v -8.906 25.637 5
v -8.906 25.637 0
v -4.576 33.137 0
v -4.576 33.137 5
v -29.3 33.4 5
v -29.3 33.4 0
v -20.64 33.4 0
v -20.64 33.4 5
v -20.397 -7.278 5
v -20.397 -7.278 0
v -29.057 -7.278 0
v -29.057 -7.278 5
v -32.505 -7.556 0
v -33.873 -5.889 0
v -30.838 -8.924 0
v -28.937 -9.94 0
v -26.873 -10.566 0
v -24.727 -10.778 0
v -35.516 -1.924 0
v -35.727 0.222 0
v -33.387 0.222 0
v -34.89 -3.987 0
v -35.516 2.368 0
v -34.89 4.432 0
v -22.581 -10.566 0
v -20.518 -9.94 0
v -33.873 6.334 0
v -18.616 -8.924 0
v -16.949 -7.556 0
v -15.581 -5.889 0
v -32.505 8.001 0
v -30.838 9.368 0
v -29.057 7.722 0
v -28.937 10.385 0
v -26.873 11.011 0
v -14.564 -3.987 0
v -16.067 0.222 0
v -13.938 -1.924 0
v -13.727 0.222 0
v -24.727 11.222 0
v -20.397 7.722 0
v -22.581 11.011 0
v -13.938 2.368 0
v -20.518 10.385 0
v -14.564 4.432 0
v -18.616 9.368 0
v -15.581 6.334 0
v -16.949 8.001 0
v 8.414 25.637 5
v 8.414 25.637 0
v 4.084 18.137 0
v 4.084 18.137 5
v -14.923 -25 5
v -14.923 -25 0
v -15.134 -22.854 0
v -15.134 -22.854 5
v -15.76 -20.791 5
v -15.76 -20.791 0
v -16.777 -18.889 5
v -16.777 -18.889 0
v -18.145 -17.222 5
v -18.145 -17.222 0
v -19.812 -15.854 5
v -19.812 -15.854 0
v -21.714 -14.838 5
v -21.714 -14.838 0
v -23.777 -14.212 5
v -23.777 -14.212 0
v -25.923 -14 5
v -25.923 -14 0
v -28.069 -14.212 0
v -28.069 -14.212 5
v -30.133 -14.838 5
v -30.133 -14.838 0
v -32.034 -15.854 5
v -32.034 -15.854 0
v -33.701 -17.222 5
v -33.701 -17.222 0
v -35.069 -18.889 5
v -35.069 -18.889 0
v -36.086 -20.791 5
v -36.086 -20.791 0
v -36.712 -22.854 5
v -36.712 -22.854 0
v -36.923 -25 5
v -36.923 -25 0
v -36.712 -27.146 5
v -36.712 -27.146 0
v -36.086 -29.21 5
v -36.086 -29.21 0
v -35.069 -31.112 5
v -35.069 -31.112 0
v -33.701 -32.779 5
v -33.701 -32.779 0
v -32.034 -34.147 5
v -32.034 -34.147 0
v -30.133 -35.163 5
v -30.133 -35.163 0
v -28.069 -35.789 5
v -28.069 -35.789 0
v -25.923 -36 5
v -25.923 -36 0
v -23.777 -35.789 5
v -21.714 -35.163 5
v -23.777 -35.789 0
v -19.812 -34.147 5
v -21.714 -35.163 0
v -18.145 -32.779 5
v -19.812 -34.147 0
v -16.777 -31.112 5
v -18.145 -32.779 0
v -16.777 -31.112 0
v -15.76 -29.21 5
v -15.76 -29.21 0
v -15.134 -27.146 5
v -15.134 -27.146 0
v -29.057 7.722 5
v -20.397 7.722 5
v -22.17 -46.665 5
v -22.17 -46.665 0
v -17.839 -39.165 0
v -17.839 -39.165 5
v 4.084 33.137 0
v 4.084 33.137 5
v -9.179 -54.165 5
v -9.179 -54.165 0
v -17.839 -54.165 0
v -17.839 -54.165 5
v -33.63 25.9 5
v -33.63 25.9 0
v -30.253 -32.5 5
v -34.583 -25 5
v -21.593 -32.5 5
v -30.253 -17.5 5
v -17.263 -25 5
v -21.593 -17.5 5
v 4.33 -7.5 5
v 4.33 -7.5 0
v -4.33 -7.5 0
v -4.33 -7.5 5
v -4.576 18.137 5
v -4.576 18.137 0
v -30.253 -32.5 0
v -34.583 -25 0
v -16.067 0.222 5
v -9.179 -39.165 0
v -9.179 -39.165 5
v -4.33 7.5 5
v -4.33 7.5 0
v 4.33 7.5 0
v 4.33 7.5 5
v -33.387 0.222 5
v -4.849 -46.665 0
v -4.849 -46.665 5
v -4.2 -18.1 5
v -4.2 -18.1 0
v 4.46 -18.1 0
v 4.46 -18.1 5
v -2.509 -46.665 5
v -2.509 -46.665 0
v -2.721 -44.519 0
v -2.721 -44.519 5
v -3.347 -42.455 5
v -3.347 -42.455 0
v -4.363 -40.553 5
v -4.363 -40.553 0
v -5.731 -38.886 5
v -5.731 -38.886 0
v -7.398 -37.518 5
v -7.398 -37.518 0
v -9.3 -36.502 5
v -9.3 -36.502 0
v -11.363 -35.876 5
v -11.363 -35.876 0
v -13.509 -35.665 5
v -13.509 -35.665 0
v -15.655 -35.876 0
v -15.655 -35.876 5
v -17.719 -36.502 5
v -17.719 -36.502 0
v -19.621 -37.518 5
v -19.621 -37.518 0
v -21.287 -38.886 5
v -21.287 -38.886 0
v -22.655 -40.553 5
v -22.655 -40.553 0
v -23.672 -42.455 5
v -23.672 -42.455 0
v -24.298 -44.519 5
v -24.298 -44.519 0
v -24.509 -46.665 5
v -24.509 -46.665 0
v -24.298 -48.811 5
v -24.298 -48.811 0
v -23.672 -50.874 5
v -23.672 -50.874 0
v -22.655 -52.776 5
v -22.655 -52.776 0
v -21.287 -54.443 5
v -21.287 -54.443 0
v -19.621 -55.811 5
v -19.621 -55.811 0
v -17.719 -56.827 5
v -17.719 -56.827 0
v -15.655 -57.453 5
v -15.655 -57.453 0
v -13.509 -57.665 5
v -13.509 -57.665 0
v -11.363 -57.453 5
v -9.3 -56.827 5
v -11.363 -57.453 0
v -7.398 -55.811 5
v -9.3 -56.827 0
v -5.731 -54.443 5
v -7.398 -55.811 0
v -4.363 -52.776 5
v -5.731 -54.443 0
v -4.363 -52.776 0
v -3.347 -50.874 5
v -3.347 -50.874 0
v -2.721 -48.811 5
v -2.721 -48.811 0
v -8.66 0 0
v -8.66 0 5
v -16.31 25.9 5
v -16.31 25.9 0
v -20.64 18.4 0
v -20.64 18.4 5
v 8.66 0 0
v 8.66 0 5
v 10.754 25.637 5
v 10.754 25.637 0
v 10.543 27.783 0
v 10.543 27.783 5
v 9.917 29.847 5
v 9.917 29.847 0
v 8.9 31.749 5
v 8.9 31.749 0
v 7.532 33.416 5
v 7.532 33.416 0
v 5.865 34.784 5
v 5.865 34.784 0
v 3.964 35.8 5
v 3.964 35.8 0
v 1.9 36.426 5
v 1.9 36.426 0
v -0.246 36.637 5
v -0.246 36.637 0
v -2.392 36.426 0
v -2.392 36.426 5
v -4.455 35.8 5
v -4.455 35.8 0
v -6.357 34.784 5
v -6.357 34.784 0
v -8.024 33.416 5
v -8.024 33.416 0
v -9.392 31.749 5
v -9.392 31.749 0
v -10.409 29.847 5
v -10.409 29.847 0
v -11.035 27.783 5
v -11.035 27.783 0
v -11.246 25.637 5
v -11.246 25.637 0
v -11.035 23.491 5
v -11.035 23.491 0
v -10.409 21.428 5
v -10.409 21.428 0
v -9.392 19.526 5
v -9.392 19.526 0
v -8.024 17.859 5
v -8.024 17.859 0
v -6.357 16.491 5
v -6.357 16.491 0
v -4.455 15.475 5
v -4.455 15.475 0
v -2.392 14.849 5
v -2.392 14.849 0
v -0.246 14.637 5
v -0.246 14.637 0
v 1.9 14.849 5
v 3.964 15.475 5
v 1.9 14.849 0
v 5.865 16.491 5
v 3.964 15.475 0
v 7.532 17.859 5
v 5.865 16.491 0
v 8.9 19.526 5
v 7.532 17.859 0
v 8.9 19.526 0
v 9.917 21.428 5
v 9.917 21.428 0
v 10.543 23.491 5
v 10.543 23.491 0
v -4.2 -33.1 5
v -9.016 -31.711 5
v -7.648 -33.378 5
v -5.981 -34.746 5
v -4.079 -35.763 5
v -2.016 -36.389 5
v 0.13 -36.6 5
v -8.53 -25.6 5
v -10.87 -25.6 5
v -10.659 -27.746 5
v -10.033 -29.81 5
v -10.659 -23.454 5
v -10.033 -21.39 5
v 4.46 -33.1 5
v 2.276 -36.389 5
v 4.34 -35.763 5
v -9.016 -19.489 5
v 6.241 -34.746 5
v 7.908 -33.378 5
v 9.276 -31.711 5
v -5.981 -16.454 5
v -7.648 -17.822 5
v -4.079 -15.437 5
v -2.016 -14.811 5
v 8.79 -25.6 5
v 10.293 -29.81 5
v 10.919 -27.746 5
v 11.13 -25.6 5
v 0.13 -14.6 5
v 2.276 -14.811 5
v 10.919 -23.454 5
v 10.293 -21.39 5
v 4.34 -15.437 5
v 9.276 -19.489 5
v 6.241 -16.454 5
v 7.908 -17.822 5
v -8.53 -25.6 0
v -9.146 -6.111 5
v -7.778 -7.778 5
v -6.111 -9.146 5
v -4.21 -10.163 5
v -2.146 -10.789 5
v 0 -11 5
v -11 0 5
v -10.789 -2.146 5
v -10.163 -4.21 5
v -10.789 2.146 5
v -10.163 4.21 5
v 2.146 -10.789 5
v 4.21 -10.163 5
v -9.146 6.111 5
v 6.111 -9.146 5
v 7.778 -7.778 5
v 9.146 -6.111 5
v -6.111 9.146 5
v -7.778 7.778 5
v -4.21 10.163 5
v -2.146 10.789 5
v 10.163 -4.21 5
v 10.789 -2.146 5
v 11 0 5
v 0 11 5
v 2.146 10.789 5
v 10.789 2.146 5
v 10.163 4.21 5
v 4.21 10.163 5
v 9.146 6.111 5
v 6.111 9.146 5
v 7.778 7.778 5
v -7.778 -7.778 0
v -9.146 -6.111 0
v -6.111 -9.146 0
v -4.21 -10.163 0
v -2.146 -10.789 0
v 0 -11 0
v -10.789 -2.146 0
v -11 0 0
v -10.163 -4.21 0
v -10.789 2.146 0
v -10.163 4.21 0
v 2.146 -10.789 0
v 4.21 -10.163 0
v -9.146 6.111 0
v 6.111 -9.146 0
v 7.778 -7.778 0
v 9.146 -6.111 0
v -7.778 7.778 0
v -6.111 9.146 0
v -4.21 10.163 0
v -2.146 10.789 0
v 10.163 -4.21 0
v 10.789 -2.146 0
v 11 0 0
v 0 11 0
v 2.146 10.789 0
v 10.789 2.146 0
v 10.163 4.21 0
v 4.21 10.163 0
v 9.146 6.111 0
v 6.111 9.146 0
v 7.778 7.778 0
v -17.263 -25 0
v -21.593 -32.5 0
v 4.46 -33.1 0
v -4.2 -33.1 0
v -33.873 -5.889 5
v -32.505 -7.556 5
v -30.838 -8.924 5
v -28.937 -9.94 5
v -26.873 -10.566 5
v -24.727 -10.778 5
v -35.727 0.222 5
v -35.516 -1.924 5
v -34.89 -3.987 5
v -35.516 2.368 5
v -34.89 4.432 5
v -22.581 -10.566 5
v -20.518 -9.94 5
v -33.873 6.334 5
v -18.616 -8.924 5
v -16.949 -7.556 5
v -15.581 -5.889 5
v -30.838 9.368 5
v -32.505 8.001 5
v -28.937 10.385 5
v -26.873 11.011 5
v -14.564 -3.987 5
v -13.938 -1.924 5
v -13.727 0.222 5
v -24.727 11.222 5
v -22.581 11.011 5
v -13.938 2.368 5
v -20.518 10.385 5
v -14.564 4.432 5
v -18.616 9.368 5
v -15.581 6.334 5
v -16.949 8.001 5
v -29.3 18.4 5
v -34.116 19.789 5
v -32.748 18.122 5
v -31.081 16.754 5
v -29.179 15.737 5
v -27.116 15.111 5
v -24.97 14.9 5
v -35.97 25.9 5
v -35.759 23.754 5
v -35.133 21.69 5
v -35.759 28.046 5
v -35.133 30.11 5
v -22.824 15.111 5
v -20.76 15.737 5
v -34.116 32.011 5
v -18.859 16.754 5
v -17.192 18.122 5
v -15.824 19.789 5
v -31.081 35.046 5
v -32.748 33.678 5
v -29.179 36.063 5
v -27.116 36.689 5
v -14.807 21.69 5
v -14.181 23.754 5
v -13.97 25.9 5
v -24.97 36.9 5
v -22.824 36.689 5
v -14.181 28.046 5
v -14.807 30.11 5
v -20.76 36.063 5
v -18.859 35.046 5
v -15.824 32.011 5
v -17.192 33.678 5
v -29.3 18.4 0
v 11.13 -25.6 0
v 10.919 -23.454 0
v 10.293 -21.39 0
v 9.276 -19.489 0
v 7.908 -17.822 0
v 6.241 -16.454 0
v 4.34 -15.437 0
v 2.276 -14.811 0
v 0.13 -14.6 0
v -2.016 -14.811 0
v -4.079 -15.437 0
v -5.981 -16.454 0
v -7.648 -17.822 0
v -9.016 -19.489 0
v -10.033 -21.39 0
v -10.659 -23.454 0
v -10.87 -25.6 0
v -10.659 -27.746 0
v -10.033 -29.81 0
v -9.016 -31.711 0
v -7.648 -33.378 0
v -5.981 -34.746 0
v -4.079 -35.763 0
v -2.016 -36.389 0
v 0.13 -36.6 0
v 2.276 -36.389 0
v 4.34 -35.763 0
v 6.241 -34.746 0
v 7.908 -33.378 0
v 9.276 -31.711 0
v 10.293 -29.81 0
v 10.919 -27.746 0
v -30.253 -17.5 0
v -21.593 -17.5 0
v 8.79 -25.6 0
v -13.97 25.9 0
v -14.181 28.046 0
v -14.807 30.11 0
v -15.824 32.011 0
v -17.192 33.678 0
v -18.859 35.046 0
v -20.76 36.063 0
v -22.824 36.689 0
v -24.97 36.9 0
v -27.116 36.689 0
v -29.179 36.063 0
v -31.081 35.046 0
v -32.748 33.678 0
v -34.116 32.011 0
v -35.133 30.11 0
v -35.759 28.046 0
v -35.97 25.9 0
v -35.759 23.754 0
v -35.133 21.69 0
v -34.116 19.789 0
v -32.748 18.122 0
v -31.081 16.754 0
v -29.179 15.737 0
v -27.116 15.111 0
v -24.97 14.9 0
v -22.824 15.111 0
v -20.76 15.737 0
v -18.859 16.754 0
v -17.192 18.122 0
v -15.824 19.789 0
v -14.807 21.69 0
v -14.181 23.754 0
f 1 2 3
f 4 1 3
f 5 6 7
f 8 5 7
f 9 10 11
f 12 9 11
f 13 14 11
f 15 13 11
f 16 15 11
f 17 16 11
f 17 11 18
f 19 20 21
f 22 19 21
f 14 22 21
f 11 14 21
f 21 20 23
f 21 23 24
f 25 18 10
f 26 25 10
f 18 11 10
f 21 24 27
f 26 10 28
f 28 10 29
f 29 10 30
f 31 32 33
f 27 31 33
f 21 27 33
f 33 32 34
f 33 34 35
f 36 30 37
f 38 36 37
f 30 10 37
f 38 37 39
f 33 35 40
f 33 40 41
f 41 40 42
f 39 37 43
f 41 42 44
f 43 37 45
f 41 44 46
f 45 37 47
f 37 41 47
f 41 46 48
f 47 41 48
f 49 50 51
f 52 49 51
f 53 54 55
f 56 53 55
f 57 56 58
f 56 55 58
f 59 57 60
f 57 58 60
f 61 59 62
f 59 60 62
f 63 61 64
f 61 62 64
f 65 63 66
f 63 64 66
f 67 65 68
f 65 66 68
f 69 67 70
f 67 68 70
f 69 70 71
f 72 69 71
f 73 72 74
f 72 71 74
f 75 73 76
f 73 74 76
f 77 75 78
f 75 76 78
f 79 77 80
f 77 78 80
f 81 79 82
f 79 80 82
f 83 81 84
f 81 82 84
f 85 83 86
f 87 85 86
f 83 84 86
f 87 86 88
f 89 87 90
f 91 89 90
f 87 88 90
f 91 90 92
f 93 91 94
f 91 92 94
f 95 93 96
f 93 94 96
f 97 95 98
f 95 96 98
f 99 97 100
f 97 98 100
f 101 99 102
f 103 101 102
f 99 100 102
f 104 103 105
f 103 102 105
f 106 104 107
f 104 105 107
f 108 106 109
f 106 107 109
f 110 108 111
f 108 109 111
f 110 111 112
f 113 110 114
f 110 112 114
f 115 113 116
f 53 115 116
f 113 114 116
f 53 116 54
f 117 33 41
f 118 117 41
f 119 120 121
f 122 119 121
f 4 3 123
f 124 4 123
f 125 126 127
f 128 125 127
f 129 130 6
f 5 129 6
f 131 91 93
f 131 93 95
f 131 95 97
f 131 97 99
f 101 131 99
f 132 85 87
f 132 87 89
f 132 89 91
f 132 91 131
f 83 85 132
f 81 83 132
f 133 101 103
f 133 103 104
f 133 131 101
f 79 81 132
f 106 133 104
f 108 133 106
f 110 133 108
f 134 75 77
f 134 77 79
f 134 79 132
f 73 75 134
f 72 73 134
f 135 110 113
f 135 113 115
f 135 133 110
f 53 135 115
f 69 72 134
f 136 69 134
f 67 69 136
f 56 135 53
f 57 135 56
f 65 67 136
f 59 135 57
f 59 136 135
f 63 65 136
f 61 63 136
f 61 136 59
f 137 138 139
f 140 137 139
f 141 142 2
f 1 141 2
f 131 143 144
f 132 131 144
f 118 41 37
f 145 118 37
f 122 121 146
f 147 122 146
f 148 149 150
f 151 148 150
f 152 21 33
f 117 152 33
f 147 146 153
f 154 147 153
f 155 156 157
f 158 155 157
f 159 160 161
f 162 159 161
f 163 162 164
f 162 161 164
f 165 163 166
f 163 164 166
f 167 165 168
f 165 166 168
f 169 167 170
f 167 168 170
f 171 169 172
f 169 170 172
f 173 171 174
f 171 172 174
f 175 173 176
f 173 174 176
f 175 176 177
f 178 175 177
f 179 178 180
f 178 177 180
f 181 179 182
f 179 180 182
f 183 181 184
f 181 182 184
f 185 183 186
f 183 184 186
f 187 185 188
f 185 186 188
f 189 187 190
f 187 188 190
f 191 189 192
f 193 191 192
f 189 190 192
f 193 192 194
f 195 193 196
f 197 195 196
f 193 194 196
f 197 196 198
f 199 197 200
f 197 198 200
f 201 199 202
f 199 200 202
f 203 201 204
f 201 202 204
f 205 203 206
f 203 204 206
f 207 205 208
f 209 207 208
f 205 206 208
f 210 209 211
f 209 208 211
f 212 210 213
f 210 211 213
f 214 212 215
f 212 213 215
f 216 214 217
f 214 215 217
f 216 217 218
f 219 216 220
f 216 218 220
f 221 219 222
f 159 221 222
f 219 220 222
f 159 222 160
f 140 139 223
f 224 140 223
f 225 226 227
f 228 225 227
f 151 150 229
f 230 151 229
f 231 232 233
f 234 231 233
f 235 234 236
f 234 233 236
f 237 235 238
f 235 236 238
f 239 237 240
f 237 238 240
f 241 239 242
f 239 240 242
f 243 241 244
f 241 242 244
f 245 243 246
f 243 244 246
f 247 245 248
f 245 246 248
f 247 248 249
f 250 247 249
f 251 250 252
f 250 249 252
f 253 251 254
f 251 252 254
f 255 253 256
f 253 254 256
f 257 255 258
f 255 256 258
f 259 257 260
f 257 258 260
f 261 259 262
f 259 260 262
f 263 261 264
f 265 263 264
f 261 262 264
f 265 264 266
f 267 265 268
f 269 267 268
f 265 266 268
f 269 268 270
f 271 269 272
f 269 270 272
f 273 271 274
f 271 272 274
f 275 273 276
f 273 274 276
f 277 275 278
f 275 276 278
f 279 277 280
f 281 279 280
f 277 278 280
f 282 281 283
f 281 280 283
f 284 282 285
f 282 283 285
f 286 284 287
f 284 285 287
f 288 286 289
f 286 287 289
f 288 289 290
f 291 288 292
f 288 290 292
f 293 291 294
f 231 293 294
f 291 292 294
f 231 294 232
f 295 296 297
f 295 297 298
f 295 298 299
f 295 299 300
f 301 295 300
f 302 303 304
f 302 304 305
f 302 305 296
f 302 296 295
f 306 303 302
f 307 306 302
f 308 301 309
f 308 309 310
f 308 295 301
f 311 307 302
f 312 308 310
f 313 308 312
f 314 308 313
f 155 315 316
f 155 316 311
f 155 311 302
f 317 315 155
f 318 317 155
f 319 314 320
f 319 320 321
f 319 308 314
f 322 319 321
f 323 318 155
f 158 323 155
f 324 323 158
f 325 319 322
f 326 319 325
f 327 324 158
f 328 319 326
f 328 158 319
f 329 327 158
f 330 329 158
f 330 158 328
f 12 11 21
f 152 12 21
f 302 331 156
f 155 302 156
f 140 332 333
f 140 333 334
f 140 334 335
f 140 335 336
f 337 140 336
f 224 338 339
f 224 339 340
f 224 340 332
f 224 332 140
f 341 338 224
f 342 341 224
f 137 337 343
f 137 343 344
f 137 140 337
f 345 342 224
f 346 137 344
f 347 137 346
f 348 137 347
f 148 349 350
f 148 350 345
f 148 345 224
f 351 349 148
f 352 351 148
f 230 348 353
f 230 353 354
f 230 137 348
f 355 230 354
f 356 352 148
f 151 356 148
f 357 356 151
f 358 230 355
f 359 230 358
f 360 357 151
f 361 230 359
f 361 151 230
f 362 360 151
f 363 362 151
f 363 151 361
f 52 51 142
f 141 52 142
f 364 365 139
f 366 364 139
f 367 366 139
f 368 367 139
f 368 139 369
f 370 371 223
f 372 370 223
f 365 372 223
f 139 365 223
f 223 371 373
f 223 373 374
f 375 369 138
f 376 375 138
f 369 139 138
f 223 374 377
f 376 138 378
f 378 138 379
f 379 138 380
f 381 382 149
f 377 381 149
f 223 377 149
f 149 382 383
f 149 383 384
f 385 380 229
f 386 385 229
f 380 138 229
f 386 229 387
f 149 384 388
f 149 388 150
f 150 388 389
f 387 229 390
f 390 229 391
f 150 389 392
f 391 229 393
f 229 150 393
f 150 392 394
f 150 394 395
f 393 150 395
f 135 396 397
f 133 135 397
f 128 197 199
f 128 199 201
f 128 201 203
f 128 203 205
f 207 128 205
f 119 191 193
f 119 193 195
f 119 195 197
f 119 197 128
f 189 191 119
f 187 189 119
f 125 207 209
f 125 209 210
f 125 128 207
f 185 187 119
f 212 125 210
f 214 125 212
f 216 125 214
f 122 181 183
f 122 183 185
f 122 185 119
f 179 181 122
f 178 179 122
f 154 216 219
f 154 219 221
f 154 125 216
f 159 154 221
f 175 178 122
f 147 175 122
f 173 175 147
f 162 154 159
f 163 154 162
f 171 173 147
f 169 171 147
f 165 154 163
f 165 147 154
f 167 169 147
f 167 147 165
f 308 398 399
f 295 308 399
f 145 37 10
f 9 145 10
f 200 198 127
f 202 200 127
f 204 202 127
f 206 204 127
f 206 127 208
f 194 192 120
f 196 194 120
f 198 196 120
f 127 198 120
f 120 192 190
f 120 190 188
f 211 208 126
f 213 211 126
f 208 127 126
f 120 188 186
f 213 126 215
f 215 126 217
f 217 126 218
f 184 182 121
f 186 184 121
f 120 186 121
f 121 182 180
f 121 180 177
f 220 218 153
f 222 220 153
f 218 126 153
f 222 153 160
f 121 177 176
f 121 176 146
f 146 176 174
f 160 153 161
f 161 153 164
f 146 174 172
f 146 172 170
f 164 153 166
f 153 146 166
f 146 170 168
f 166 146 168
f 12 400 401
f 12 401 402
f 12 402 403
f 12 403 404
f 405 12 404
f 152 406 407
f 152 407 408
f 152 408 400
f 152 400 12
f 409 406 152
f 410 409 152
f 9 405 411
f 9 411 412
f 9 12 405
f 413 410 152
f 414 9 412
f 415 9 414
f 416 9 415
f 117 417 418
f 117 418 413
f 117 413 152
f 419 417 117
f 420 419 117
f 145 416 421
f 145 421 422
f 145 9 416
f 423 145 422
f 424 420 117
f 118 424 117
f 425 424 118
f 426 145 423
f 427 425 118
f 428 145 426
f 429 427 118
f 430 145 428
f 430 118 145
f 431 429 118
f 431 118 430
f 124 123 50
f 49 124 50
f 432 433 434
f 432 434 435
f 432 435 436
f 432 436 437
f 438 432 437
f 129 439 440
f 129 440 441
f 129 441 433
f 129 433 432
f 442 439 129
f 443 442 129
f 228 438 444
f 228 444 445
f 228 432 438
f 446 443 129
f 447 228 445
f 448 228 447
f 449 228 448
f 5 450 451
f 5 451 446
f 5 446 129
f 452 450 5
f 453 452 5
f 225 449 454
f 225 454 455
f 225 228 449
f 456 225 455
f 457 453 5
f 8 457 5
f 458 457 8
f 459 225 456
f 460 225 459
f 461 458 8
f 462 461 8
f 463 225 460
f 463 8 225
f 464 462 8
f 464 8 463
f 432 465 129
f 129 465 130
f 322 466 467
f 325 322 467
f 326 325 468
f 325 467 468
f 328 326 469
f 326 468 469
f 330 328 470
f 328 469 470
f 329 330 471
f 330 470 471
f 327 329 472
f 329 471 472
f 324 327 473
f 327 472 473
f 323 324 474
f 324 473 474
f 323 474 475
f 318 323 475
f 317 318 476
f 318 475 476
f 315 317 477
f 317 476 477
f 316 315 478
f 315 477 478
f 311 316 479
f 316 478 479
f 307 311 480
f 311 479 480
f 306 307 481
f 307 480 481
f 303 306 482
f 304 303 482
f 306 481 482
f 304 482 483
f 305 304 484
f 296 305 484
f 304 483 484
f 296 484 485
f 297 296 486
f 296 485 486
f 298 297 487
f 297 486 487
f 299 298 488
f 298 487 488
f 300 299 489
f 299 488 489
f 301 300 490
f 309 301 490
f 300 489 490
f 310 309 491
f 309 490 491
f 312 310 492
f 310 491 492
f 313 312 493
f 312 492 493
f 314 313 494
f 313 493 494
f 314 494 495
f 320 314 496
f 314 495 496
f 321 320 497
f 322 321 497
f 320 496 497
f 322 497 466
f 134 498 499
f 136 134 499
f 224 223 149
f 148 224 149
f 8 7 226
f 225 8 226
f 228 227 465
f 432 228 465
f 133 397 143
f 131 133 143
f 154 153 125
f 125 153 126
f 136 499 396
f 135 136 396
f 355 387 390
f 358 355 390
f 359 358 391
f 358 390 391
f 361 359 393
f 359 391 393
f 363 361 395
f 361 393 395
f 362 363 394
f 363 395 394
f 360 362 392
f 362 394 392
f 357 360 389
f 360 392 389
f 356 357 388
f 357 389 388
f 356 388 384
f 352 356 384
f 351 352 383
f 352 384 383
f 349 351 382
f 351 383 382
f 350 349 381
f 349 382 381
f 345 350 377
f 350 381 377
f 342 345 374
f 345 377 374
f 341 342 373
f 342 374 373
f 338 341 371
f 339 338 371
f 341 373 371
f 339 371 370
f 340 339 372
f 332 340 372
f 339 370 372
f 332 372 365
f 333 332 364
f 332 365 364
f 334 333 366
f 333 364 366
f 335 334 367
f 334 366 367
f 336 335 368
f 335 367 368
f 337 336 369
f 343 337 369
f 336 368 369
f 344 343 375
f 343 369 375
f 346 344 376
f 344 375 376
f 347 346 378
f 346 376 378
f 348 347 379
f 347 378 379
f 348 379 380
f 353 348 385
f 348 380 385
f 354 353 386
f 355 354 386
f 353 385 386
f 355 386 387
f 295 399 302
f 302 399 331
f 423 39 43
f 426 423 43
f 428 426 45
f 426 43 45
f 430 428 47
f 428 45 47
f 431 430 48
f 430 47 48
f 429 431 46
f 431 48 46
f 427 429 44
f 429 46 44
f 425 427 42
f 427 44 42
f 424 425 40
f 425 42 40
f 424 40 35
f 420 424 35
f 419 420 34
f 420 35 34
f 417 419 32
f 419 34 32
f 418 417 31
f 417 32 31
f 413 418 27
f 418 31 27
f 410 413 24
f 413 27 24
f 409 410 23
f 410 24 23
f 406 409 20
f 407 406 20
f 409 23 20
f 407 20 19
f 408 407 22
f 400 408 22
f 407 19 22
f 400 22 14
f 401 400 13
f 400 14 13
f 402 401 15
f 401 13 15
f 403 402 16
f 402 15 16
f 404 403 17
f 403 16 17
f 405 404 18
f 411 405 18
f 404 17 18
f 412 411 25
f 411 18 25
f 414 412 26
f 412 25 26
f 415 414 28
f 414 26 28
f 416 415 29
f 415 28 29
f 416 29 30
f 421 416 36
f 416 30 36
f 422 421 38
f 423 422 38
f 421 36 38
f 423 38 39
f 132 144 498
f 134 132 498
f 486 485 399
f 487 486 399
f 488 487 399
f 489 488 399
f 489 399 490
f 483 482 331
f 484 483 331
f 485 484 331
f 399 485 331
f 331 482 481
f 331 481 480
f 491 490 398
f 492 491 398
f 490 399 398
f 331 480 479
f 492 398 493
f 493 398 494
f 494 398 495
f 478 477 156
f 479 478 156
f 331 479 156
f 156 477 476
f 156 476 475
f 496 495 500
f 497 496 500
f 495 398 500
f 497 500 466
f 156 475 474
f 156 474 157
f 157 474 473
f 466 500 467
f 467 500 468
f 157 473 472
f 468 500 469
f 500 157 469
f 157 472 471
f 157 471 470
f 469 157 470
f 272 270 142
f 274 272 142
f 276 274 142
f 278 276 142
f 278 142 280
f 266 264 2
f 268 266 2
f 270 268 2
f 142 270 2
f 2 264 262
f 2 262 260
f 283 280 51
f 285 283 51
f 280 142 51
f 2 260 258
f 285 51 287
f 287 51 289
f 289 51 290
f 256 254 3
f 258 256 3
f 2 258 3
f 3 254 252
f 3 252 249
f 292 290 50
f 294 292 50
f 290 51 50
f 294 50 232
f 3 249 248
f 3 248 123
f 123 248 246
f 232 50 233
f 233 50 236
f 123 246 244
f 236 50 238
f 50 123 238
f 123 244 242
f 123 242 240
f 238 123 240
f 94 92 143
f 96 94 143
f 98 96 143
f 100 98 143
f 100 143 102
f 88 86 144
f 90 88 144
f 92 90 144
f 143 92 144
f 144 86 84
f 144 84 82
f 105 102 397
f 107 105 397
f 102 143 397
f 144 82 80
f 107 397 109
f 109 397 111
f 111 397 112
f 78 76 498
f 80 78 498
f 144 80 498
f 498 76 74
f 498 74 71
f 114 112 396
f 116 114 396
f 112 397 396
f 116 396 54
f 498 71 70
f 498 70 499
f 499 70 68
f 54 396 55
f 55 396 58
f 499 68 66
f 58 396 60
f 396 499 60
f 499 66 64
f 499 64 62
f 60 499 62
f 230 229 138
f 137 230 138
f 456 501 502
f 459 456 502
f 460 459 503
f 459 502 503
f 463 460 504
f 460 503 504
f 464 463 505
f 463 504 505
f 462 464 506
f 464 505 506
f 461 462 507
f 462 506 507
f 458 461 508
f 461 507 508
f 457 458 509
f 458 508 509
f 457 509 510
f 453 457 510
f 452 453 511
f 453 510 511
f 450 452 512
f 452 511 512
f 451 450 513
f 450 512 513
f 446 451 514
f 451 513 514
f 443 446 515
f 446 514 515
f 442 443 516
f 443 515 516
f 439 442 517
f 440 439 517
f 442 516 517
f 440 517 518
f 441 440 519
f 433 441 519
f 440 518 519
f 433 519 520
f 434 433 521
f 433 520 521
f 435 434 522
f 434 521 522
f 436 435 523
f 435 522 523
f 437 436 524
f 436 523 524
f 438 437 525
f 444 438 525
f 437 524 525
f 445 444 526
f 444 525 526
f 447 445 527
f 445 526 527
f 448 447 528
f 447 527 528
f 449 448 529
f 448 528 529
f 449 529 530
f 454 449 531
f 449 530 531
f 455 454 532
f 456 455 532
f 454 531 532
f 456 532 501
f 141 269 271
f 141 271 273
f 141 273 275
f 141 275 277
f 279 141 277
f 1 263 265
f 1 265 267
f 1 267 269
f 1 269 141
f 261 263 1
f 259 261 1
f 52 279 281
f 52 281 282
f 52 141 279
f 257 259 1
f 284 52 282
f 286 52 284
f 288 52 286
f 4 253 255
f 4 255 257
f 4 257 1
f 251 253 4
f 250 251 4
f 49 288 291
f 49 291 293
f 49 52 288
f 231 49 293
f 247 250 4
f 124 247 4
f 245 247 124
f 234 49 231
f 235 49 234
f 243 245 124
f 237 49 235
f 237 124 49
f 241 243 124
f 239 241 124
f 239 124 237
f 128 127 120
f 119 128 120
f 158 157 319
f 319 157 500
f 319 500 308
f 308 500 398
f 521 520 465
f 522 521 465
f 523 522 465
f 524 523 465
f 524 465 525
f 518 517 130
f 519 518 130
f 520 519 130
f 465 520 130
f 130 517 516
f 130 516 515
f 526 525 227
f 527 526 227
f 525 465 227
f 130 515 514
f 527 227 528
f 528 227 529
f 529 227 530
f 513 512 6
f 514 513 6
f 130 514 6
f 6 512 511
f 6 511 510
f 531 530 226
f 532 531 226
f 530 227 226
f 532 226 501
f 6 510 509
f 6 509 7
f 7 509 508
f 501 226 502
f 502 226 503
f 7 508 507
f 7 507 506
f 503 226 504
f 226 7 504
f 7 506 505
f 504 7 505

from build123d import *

# Parameters (mm, degrees)
F0_R     = 11
F1_DEPTH = 5


with BuildPart() as f1:
    # F0 (on Top) → F1 (new body)
    with BuildSketch(Plane.XY):
        Circle(F0_R)
        Polygon((-8.660254, 0), (-4.330127, 7.5), (4.330127, 7.5), (8.660254, 0), (4.330127, -7.5), (-4.330127, -7.5), align=None, mode=Mode.SUBTRACT)
        with Locations((-0.245953, 25.637358)):
            Circle(F0_R)
        Polygon((-8.906207, 25.637358), (-4.57608, 33.137358), (4.084174, 33.137358), (8.414301, 25.637358), (4.084174, 18.137358), (-4.57608, 18.137358), align=None, mode=Mode.SUBTRACT)
        with Locations((0.130127, -25.600002)):
            Circle(F0_R)
        Polygon((-8.530127, -25.600002), (-4.2, -18.100002), (4.460254, -18.100002), (8.790381, -25.600002), (4.460254, -33.100002), (-4.2, -33.100002), align=None, mode=Mode.SUBTRACT)
        with Locations((-24.96987, 25.899999)):
            Circle(F0_R)
        Polygon((-33.630124, 25.899999), (-29.299997, 33.399999), (-20.639743, 33.399999), (-16.309616, 25.899999), (-20.639743, 18.399999), (-29.299997, 18.399999), align=None, mode=Mode.SUBTRACT)
        with Locations((-24.72704, 0.222328)):
            Circle(F0_R)
        Polygon((-33.387294, 0.222328), (-29.057167, 7.722328), (-20.396913, 7.722328), (-16.066786, 0.222328), (-20.396913, -7.277672), (-29.057167, -7.277672), align=None, mode=Mode.SUBTRACT)
        with Locations((-25.923064, -25.00039)):
            Circle(F0_R)
        Polygon((-34.583318, -25.00039), (-30.253191, -17.50039), (-21.592937, -17.50039), (-17.262809, -25.00039), (-21.592937, -32.50039), (-30.253191, -32.50039), align=None, mode=Mode.SUBTRACT)
        with Locations((-13.509253, -46.664544)):
            Circle(F0_R)
        Polygon((-22.169507, -46.664544), (-17.83938, -39.164544), (-9.179126, -39.164544), (-4.848999, -46.664544), (-9.179126, -54.164544), (-17.83938, -54.164544), align=None, mode=Mode.SUBTRACT)
    extrude(amount=F1_DEPTH)


solid = f1.part
